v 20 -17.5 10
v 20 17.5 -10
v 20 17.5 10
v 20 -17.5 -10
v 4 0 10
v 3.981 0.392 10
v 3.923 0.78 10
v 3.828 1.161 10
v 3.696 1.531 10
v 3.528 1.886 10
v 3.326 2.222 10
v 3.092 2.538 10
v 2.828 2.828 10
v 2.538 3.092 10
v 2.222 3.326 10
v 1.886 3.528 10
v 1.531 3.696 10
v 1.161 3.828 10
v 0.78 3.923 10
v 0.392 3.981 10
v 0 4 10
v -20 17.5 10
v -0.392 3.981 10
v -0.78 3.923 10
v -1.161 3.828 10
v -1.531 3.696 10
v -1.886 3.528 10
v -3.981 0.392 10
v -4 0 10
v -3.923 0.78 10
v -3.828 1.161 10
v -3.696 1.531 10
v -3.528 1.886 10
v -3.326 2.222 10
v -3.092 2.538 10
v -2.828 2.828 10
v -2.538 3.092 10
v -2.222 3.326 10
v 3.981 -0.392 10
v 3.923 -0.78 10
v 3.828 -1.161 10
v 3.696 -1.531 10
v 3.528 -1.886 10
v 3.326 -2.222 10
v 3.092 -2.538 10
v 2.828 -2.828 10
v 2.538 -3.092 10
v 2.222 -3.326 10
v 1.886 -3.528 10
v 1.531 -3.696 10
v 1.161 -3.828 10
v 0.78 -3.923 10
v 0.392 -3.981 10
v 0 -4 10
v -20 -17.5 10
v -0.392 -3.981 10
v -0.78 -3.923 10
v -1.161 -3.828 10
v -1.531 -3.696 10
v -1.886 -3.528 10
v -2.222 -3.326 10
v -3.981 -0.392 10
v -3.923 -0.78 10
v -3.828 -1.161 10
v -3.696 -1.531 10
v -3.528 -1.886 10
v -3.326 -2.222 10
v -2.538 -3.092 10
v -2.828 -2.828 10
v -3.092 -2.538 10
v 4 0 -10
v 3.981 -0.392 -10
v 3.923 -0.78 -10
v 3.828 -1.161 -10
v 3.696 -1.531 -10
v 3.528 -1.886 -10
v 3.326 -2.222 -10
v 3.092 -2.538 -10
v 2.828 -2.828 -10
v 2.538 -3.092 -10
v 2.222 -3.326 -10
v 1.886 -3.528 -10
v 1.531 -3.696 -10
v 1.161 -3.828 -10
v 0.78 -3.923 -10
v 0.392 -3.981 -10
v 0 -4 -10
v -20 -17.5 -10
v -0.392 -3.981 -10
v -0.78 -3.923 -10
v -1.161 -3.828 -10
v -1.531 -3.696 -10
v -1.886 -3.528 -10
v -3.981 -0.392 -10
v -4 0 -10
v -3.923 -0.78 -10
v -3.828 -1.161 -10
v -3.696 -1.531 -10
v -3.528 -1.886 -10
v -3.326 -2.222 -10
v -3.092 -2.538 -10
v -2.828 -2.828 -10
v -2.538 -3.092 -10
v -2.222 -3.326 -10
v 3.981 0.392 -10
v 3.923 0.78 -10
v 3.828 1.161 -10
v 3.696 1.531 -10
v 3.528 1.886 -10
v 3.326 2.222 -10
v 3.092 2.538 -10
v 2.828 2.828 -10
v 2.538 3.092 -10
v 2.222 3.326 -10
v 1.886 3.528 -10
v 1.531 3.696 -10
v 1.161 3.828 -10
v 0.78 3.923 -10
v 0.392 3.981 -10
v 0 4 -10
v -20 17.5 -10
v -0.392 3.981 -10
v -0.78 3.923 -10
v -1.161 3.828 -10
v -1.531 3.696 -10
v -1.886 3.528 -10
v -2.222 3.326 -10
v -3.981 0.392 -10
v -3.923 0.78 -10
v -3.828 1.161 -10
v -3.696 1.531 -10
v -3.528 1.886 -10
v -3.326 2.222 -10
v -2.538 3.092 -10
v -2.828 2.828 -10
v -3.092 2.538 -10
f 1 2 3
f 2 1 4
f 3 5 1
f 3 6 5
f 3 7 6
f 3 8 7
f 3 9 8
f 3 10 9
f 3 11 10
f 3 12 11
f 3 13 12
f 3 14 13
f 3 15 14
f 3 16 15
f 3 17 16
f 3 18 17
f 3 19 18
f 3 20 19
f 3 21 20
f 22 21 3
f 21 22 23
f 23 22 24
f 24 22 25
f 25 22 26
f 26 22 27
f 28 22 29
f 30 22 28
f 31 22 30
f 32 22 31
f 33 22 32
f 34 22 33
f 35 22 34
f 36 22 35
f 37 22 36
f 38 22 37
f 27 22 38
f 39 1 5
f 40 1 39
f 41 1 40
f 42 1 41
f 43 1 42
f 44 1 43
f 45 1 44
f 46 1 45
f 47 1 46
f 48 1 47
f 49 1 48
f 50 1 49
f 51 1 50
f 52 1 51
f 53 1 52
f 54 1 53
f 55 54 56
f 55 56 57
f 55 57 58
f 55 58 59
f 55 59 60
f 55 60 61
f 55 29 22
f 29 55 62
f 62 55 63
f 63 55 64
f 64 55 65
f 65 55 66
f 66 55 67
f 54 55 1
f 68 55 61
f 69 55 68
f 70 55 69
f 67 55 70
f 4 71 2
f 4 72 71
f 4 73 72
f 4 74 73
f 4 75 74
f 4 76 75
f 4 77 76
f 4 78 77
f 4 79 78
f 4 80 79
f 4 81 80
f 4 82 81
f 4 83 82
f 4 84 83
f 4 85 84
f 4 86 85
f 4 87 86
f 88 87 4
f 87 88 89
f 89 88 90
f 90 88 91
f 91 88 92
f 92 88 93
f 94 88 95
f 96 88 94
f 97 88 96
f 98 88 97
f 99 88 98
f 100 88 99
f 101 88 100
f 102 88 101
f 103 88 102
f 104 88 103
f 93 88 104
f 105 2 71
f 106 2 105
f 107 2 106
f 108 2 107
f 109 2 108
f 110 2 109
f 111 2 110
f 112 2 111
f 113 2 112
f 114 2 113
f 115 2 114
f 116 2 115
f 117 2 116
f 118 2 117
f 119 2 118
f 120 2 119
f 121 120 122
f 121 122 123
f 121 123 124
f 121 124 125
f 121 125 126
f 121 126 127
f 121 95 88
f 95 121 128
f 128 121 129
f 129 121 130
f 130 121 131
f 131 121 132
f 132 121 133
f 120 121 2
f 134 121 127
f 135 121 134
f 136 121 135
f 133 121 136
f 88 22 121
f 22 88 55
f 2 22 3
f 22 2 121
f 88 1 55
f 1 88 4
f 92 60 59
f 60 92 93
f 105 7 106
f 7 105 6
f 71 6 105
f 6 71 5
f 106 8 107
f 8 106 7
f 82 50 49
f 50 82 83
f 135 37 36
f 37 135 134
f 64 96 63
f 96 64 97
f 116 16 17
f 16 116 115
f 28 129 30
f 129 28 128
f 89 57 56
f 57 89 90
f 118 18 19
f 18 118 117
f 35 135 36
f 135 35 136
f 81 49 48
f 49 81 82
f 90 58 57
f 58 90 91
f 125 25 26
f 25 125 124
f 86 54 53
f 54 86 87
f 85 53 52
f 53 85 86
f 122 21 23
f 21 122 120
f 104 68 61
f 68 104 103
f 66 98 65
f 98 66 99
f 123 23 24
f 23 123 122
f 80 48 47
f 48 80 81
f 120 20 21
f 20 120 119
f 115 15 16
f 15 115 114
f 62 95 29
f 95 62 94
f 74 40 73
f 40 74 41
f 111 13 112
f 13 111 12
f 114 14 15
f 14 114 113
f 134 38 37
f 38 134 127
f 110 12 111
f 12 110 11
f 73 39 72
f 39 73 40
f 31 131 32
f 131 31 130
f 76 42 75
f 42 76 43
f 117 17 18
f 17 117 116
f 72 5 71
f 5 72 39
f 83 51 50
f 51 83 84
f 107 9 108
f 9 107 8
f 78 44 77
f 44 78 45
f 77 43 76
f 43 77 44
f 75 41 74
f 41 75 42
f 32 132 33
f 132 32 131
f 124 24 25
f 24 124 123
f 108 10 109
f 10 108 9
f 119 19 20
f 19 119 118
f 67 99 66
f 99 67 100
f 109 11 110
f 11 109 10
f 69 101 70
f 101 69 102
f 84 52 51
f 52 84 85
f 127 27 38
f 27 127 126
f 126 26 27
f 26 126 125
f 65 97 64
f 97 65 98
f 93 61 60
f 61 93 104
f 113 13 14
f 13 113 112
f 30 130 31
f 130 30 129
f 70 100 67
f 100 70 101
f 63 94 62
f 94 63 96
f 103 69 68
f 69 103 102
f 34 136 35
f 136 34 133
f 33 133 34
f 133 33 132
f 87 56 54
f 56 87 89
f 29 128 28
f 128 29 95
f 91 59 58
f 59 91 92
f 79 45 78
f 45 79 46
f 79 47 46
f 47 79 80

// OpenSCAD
module linear_bearing_block() {
    difference() {
        // Main block
        cube([40, 35, 20], center = true);
        
        // Shaft hole
        translate([0, 0, 0])
            cylinder(h = 20, d = 8, $fn = 64, center = true);
    }
}

linear_bearing_block();
